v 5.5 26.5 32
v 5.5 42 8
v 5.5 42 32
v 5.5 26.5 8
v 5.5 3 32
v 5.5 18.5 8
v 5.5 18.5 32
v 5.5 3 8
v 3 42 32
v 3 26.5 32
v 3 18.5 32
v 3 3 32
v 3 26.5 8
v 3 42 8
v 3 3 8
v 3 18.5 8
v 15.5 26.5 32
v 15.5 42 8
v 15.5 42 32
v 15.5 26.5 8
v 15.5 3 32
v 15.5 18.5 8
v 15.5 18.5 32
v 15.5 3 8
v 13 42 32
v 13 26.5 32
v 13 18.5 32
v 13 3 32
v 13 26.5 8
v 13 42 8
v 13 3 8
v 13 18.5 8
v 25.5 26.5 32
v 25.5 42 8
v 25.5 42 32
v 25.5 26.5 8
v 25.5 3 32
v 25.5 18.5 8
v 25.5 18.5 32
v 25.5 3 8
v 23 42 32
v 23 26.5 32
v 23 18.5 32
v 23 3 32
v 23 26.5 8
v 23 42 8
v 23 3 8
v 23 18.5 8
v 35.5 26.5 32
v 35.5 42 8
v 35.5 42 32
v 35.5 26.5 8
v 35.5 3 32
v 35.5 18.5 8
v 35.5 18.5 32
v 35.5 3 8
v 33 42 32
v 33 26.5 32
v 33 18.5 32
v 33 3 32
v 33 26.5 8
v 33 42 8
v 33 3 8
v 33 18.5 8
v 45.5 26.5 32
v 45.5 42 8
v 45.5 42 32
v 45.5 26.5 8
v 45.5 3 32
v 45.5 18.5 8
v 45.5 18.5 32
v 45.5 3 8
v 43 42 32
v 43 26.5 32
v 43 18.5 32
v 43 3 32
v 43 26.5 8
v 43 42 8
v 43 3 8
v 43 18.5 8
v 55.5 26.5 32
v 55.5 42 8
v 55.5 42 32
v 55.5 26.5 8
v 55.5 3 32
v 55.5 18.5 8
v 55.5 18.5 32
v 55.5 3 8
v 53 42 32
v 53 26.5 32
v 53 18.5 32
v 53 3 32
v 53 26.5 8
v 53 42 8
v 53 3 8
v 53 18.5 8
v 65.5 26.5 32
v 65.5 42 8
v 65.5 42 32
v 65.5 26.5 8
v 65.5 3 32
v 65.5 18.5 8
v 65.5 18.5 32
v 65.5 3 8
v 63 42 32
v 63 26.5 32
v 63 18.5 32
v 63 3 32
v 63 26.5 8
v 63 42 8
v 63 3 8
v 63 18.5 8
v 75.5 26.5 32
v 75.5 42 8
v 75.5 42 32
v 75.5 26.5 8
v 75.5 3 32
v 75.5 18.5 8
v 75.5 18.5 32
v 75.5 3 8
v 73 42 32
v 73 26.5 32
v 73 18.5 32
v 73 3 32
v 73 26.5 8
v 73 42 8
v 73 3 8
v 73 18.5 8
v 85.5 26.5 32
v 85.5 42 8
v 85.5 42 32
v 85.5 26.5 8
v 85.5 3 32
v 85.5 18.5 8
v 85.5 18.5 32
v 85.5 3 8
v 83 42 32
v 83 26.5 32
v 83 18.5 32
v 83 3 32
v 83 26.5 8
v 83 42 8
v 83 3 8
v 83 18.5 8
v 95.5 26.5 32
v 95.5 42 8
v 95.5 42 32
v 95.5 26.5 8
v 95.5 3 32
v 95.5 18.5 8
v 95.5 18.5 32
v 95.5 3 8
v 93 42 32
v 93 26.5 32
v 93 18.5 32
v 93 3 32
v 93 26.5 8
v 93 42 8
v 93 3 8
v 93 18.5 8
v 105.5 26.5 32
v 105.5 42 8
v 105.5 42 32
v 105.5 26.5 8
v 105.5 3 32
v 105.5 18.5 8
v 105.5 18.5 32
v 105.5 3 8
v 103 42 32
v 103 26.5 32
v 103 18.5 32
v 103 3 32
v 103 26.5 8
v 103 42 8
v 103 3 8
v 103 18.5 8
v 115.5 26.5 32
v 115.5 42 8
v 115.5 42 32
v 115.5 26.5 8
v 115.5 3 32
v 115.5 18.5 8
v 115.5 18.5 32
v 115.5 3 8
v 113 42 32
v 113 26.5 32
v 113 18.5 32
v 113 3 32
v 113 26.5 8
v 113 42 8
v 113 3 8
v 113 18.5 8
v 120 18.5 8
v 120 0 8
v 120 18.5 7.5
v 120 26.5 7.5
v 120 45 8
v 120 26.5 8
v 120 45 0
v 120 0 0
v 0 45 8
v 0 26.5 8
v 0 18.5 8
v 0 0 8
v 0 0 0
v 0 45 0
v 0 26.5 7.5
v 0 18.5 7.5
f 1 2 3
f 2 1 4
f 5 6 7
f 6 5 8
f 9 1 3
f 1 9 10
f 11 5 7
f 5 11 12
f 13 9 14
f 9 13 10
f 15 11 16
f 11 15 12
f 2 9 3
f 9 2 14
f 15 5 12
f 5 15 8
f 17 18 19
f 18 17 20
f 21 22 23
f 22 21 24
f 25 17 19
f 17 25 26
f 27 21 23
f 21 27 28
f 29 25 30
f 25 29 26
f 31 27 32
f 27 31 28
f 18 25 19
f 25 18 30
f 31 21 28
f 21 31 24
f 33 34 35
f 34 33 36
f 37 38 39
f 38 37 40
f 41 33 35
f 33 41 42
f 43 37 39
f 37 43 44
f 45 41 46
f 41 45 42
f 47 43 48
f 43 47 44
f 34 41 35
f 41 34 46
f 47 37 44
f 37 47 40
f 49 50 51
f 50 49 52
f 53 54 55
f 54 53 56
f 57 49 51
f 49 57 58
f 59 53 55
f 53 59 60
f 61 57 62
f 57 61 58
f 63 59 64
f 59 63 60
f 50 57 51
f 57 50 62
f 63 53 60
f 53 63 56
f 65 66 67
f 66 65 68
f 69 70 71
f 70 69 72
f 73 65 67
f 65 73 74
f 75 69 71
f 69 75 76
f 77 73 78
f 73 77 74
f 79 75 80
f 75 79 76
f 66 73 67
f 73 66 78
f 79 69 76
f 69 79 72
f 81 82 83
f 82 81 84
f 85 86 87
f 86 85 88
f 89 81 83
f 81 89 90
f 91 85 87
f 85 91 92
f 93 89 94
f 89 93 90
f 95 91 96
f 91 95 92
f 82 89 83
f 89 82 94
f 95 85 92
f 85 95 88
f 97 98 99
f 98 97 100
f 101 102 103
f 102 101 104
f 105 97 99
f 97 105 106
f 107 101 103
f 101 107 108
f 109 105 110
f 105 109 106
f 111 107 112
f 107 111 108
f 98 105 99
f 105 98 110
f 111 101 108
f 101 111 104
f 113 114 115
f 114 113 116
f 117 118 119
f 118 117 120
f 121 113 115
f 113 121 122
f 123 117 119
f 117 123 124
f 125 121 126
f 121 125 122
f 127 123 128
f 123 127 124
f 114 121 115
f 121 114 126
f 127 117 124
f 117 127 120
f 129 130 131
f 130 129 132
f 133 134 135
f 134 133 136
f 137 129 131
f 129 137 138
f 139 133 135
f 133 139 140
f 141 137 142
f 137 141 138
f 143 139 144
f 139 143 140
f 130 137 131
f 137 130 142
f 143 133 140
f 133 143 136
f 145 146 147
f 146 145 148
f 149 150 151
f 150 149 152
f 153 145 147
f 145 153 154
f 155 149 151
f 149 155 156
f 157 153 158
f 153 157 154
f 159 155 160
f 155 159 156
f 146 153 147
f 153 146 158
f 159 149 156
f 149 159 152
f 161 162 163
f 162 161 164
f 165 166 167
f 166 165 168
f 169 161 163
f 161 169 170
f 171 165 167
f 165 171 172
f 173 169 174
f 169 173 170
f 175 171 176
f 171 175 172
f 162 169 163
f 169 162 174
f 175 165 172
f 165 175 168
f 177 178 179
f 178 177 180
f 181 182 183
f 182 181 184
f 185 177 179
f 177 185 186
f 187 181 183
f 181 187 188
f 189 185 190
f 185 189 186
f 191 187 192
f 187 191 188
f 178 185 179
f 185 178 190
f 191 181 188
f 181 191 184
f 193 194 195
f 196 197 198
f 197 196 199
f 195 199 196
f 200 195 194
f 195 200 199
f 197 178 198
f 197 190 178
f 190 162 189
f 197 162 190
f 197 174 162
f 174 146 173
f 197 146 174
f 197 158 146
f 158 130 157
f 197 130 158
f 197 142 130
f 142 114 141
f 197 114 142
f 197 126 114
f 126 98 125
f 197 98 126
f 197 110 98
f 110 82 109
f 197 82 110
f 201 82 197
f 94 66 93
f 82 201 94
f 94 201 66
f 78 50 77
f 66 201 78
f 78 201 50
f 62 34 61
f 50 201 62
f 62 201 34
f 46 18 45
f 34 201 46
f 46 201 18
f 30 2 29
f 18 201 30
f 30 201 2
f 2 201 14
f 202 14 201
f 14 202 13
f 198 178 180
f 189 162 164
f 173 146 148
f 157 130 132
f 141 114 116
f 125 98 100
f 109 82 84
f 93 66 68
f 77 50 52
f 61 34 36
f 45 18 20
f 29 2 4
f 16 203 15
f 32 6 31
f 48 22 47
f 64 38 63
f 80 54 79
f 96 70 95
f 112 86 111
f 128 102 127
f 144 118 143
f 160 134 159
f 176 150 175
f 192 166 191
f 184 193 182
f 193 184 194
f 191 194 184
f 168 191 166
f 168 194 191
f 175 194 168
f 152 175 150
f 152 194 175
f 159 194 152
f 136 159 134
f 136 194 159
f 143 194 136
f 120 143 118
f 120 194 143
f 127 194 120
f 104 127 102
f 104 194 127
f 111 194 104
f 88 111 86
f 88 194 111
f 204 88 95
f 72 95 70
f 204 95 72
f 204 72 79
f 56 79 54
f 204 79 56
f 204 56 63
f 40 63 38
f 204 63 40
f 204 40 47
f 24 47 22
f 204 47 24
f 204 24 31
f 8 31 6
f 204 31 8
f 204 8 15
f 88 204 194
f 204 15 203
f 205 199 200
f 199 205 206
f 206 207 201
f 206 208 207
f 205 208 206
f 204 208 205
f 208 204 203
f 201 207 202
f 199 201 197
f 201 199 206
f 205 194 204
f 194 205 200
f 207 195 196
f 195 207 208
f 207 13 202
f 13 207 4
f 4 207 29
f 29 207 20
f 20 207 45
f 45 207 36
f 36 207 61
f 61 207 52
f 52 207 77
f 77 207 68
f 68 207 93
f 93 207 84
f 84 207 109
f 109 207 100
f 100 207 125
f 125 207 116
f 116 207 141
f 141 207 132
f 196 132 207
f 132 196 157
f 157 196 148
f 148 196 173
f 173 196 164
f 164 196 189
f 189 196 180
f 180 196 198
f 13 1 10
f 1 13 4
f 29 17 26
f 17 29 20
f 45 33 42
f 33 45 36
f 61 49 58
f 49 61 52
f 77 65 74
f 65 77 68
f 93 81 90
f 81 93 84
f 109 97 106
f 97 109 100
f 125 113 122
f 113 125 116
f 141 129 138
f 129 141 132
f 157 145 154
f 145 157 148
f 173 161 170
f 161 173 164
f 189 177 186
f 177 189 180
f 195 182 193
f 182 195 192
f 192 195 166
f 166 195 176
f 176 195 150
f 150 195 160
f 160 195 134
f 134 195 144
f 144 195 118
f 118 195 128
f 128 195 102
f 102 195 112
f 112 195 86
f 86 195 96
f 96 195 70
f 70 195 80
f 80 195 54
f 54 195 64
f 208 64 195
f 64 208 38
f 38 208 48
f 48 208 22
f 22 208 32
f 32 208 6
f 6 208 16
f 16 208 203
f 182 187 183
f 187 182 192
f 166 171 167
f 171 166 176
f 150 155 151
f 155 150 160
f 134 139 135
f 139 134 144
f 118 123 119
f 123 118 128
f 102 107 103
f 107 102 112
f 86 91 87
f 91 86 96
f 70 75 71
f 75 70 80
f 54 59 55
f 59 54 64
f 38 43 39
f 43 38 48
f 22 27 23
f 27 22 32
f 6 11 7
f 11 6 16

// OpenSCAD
$fn = 32;

// ----------------------------------------------------------------------
// Heatsink: slotted fin block
// ----------------------------------------------------------------------

// --- parameters (mm) ---
base_l = 120;             // base length, X
base_w = 45;              // base width, Y
base_t = 8;               // base plate thickness
fin_h = 25;               // fin height above the base
fin_t = 2.5;              // fin thickness
edge = 3;                 // margin from the base ends
pitch = 10;               // fin pitch
slot_w = 8;               // central slot width, Y

n_fins = floor((base_l - 2 * edge - fin_t) / pitch) + 1;  // fin count
total_h = base_t + fin_h - 1;  // overall height

difference() {
union() {
  cube([base_l, base_w, base_t]);
  for (i = [0 : n_fins - 1])
    translate([edge + i * pitch, edge, base_t - 1])
      cube([fin_t, base_w - 2 * edge, fin_h]);
}
  translate([-1, base_w / 2 - slot_w / 2, base_t - 0.5])
    cube([base_l + 2, slot_w, fin_h + 2]);
}
